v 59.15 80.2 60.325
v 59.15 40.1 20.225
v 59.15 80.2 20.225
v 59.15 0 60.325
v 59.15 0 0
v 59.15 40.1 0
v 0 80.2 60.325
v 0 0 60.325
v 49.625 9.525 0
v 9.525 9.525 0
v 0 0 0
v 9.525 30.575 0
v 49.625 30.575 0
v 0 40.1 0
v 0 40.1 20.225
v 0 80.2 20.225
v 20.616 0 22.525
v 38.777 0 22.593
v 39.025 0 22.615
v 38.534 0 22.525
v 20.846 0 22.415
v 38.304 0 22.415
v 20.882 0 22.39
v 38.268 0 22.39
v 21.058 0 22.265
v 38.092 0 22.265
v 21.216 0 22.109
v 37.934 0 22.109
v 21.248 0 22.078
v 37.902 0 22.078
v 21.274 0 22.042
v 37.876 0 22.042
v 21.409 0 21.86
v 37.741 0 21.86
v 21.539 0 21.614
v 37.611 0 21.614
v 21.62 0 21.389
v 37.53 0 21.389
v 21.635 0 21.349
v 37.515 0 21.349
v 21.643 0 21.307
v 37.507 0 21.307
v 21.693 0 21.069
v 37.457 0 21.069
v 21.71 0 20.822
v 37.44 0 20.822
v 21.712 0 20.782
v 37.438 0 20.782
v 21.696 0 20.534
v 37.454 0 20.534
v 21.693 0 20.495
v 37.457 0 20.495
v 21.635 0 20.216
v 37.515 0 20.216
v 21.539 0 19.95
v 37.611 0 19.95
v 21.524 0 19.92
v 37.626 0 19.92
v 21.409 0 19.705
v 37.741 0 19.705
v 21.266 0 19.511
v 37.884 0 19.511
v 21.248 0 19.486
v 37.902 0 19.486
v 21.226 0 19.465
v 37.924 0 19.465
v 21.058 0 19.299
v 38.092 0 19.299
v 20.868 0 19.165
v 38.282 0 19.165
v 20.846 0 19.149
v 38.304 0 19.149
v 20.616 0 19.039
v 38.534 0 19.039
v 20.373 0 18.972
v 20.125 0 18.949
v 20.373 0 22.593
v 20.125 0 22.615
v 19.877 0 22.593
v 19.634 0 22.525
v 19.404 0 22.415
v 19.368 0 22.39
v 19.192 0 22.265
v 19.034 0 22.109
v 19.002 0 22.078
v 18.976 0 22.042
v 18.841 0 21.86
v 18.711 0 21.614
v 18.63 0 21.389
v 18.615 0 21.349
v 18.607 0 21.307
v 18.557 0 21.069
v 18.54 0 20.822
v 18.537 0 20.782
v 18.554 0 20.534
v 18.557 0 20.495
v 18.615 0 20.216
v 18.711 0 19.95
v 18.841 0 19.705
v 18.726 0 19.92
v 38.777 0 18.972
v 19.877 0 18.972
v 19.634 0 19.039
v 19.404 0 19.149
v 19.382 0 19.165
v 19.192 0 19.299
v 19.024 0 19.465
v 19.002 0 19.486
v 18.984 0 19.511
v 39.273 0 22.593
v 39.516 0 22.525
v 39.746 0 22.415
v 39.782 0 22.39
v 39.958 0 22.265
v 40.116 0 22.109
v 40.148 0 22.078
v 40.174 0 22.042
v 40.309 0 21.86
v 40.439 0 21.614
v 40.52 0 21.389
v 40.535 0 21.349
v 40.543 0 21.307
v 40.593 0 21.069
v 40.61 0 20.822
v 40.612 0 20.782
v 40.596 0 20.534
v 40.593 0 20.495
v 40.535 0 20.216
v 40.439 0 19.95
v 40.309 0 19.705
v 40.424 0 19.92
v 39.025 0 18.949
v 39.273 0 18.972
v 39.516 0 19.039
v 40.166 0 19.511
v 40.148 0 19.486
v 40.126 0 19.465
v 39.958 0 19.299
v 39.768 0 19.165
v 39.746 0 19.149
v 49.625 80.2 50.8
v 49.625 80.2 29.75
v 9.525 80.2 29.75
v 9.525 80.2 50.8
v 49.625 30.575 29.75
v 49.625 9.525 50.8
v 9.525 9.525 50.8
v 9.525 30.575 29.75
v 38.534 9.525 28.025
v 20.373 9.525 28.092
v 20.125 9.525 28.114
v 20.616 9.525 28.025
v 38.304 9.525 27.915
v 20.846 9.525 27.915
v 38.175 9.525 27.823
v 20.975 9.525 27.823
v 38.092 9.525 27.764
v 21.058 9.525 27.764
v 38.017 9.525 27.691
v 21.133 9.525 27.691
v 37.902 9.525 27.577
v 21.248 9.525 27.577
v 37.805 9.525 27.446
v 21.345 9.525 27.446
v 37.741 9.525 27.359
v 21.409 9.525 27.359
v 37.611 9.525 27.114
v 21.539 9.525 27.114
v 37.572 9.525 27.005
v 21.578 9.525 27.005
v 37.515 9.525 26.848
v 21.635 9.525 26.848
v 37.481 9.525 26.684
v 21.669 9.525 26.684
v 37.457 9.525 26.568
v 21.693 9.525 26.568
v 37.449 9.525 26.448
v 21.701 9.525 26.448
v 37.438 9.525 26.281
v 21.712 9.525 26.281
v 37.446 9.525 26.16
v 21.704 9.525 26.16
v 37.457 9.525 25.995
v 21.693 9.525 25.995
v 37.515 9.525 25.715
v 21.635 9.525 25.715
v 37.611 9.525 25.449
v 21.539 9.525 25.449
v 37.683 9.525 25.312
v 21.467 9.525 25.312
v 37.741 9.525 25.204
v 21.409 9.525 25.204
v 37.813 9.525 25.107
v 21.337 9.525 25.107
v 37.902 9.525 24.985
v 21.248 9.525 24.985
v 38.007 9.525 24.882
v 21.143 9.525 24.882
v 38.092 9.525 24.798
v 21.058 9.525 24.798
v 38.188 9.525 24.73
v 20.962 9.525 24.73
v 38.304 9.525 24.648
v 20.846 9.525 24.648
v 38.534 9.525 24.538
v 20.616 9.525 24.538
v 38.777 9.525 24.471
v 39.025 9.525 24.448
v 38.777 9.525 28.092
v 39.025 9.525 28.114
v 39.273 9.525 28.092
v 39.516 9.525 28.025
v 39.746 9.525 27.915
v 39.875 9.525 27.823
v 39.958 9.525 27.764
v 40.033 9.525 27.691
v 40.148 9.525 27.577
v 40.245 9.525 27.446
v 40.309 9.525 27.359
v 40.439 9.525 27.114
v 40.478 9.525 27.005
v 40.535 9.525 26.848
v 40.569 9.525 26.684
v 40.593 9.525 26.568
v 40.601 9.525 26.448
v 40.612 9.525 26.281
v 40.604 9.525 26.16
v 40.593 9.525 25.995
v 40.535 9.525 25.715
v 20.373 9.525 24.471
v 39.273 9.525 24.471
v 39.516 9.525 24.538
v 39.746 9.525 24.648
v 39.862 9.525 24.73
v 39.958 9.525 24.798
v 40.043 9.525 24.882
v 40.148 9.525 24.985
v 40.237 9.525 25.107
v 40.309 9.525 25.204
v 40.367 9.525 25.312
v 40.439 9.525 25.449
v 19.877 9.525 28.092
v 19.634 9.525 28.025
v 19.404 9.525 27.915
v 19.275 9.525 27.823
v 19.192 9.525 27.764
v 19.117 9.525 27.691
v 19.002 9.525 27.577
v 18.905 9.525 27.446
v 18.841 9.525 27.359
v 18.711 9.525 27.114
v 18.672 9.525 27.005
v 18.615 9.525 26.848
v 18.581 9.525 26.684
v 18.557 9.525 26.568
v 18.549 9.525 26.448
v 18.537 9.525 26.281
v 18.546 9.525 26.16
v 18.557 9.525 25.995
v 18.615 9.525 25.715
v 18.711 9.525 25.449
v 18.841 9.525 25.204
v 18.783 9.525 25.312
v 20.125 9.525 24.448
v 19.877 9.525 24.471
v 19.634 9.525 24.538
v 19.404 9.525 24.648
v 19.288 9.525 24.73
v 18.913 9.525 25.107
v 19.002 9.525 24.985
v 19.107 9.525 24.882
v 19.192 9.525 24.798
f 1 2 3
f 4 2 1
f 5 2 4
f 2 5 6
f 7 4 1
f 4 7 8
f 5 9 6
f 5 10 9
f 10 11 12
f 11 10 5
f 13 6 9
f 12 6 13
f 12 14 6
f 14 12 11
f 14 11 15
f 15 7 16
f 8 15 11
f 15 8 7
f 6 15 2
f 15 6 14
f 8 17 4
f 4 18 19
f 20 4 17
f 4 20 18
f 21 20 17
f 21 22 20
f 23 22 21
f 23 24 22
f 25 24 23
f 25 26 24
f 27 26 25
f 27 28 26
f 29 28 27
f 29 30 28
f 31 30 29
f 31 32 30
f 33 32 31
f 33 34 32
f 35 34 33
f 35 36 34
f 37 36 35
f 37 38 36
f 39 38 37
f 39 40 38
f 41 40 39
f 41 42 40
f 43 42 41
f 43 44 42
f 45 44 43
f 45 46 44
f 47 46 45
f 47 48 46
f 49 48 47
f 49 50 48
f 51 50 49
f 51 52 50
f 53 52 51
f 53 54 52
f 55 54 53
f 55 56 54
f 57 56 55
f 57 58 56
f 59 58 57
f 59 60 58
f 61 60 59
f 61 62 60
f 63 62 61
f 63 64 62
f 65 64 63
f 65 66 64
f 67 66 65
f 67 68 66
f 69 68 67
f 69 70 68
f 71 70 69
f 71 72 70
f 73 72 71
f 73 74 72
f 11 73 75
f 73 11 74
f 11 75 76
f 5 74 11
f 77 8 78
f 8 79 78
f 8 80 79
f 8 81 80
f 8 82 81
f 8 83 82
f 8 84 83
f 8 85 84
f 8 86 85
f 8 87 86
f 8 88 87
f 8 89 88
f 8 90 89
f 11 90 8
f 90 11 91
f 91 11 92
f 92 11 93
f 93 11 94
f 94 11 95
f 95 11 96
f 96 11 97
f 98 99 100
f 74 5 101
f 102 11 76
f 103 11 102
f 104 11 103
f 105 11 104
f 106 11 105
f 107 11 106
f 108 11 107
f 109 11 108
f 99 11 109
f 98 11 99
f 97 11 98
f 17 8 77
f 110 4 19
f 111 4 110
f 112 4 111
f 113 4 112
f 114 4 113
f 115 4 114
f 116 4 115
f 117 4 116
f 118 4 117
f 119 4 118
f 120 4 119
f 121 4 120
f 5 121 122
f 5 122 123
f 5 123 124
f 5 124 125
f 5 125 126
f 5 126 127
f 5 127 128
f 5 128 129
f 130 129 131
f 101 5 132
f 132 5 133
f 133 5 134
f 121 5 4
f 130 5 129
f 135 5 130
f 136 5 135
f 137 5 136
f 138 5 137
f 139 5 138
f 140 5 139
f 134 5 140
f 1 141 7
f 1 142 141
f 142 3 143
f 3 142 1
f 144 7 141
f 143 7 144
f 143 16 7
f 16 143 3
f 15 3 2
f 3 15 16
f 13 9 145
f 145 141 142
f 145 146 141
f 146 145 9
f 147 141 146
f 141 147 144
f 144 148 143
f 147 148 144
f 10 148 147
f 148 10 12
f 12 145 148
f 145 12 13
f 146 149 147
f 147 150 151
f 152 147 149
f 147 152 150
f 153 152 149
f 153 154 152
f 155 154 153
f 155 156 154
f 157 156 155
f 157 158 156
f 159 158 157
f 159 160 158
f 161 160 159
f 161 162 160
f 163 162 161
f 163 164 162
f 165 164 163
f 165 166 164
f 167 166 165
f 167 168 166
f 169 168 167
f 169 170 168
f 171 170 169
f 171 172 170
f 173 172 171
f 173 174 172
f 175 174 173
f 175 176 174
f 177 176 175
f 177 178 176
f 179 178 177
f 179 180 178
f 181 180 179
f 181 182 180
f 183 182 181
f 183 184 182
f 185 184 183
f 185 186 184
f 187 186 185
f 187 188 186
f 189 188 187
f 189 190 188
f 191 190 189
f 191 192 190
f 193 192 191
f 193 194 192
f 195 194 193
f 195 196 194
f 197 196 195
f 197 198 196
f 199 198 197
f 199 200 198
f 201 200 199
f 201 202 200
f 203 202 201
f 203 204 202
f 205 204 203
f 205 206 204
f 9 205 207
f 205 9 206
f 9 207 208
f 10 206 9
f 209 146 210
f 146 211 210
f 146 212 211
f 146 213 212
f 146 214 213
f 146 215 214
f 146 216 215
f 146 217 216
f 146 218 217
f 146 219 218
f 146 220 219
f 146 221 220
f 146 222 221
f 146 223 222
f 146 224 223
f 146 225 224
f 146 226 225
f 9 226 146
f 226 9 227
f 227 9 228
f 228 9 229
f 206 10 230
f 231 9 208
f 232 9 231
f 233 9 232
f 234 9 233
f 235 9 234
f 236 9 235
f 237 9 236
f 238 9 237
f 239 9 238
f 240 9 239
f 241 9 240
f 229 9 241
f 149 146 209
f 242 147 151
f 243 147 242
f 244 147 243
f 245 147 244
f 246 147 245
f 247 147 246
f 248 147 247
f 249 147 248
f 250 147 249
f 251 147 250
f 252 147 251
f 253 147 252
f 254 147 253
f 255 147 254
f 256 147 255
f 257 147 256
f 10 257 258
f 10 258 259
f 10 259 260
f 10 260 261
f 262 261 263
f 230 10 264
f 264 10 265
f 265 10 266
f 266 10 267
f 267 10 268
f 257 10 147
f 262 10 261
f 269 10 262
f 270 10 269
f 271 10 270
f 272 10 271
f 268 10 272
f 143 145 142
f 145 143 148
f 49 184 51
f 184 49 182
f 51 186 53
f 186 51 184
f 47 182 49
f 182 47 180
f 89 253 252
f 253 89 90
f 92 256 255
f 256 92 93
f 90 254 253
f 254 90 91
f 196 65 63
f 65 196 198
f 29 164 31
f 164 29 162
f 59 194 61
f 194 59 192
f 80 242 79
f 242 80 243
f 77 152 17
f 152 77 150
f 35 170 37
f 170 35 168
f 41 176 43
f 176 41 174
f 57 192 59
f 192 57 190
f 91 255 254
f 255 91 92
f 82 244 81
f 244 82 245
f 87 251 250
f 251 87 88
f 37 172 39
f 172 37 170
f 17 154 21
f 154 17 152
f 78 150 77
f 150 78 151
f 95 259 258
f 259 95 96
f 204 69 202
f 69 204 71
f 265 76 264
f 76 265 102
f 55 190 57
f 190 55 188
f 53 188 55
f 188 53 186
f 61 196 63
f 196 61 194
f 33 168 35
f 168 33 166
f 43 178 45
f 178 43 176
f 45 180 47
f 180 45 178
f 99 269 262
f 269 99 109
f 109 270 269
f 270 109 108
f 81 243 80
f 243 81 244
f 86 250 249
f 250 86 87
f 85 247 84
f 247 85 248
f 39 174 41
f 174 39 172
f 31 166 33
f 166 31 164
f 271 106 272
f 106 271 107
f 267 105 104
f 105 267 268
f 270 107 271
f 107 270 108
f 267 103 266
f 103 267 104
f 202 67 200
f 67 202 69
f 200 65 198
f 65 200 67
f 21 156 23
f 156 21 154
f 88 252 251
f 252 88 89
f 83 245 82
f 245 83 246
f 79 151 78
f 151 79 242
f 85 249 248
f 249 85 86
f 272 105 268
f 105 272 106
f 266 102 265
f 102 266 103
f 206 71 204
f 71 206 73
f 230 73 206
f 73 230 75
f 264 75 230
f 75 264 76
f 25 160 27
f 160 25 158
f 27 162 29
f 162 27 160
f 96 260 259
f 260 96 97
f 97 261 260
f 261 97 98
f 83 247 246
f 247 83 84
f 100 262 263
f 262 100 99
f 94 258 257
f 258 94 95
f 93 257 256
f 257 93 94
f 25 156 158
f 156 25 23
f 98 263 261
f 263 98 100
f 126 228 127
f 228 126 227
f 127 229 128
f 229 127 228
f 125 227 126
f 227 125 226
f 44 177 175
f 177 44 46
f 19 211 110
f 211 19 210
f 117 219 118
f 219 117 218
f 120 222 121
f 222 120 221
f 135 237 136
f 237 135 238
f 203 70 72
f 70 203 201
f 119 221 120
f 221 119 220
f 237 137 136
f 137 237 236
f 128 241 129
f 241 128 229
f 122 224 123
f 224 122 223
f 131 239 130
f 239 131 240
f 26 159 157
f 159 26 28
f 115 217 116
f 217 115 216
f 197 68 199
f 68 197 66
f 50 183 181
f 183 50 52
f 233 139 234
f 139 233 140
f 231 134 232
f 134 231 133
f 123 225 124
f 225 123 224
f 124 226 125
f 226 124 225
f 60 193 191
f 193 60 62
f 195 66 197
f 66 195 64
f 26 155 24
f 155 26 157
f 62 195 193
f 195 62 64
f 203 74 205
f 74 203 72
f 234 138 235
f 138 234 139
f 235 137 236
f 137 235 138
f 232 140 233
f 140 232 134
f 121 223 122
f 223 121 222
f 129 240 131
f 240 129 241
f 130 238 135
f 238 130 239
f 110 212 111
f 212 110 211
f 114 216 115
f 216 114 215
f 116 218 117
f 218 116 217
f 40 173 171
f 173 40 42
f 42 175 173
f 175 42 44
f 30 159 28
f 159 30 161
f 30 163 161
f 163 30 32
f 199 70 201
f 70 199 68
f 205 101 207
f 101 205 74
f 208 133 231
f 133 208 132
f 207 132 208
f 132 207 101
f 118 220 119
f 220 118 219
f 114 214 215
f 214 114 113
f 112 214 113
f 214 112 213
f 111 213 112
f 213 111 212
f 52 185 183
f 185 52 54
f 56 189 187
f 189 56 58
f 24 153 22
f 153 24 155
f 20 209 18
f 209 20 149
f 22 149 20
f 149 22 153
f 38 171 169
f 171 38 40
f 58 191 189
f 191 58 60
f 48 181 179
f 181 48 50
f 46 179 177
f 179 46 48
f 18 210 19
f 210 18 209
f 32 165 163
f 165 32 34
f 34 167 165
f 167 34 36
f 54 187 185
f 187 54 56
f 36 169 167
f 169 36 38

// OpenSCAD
$fn = 40;
length = 50.8;

wall = 9.525;
slop = 2;

width =  38.1 + slop;
height = 19.05 + slop;

smallshankd = 3.175;
shankdiameter = 8.5;
spacing = 6.35;

difference(){
    union(){
        cube([width+wall*2,height+wall*2,length+        wall],0);
        translate([0,2*(height+wall*2),(length+         wall)-(height+wall*2)])rotate([90,0,0         ])cube([width+wall*2,height+wall*2,         length],0);
    }
    translate([wall,wall,0])cube([width,height,length],0);

      translate([0,2*(height+wall*2),(length+         wall)-(height+wall*2)])rotate([90,0,0])translate([wall,wall,0])cube([width,height,length],0);

    //holes
    translate([wall+shankdiameter/2+spacing,-3,length-31.75])rotate([-60,0,0])cylinder(d=smallshankd, 25);
    translate([width+wall*2-(wall+shankdiameter/2+spacing),-3,length-31.75])rotate([-60,0,0])cylinder(d=smallshankd, 25);
}
